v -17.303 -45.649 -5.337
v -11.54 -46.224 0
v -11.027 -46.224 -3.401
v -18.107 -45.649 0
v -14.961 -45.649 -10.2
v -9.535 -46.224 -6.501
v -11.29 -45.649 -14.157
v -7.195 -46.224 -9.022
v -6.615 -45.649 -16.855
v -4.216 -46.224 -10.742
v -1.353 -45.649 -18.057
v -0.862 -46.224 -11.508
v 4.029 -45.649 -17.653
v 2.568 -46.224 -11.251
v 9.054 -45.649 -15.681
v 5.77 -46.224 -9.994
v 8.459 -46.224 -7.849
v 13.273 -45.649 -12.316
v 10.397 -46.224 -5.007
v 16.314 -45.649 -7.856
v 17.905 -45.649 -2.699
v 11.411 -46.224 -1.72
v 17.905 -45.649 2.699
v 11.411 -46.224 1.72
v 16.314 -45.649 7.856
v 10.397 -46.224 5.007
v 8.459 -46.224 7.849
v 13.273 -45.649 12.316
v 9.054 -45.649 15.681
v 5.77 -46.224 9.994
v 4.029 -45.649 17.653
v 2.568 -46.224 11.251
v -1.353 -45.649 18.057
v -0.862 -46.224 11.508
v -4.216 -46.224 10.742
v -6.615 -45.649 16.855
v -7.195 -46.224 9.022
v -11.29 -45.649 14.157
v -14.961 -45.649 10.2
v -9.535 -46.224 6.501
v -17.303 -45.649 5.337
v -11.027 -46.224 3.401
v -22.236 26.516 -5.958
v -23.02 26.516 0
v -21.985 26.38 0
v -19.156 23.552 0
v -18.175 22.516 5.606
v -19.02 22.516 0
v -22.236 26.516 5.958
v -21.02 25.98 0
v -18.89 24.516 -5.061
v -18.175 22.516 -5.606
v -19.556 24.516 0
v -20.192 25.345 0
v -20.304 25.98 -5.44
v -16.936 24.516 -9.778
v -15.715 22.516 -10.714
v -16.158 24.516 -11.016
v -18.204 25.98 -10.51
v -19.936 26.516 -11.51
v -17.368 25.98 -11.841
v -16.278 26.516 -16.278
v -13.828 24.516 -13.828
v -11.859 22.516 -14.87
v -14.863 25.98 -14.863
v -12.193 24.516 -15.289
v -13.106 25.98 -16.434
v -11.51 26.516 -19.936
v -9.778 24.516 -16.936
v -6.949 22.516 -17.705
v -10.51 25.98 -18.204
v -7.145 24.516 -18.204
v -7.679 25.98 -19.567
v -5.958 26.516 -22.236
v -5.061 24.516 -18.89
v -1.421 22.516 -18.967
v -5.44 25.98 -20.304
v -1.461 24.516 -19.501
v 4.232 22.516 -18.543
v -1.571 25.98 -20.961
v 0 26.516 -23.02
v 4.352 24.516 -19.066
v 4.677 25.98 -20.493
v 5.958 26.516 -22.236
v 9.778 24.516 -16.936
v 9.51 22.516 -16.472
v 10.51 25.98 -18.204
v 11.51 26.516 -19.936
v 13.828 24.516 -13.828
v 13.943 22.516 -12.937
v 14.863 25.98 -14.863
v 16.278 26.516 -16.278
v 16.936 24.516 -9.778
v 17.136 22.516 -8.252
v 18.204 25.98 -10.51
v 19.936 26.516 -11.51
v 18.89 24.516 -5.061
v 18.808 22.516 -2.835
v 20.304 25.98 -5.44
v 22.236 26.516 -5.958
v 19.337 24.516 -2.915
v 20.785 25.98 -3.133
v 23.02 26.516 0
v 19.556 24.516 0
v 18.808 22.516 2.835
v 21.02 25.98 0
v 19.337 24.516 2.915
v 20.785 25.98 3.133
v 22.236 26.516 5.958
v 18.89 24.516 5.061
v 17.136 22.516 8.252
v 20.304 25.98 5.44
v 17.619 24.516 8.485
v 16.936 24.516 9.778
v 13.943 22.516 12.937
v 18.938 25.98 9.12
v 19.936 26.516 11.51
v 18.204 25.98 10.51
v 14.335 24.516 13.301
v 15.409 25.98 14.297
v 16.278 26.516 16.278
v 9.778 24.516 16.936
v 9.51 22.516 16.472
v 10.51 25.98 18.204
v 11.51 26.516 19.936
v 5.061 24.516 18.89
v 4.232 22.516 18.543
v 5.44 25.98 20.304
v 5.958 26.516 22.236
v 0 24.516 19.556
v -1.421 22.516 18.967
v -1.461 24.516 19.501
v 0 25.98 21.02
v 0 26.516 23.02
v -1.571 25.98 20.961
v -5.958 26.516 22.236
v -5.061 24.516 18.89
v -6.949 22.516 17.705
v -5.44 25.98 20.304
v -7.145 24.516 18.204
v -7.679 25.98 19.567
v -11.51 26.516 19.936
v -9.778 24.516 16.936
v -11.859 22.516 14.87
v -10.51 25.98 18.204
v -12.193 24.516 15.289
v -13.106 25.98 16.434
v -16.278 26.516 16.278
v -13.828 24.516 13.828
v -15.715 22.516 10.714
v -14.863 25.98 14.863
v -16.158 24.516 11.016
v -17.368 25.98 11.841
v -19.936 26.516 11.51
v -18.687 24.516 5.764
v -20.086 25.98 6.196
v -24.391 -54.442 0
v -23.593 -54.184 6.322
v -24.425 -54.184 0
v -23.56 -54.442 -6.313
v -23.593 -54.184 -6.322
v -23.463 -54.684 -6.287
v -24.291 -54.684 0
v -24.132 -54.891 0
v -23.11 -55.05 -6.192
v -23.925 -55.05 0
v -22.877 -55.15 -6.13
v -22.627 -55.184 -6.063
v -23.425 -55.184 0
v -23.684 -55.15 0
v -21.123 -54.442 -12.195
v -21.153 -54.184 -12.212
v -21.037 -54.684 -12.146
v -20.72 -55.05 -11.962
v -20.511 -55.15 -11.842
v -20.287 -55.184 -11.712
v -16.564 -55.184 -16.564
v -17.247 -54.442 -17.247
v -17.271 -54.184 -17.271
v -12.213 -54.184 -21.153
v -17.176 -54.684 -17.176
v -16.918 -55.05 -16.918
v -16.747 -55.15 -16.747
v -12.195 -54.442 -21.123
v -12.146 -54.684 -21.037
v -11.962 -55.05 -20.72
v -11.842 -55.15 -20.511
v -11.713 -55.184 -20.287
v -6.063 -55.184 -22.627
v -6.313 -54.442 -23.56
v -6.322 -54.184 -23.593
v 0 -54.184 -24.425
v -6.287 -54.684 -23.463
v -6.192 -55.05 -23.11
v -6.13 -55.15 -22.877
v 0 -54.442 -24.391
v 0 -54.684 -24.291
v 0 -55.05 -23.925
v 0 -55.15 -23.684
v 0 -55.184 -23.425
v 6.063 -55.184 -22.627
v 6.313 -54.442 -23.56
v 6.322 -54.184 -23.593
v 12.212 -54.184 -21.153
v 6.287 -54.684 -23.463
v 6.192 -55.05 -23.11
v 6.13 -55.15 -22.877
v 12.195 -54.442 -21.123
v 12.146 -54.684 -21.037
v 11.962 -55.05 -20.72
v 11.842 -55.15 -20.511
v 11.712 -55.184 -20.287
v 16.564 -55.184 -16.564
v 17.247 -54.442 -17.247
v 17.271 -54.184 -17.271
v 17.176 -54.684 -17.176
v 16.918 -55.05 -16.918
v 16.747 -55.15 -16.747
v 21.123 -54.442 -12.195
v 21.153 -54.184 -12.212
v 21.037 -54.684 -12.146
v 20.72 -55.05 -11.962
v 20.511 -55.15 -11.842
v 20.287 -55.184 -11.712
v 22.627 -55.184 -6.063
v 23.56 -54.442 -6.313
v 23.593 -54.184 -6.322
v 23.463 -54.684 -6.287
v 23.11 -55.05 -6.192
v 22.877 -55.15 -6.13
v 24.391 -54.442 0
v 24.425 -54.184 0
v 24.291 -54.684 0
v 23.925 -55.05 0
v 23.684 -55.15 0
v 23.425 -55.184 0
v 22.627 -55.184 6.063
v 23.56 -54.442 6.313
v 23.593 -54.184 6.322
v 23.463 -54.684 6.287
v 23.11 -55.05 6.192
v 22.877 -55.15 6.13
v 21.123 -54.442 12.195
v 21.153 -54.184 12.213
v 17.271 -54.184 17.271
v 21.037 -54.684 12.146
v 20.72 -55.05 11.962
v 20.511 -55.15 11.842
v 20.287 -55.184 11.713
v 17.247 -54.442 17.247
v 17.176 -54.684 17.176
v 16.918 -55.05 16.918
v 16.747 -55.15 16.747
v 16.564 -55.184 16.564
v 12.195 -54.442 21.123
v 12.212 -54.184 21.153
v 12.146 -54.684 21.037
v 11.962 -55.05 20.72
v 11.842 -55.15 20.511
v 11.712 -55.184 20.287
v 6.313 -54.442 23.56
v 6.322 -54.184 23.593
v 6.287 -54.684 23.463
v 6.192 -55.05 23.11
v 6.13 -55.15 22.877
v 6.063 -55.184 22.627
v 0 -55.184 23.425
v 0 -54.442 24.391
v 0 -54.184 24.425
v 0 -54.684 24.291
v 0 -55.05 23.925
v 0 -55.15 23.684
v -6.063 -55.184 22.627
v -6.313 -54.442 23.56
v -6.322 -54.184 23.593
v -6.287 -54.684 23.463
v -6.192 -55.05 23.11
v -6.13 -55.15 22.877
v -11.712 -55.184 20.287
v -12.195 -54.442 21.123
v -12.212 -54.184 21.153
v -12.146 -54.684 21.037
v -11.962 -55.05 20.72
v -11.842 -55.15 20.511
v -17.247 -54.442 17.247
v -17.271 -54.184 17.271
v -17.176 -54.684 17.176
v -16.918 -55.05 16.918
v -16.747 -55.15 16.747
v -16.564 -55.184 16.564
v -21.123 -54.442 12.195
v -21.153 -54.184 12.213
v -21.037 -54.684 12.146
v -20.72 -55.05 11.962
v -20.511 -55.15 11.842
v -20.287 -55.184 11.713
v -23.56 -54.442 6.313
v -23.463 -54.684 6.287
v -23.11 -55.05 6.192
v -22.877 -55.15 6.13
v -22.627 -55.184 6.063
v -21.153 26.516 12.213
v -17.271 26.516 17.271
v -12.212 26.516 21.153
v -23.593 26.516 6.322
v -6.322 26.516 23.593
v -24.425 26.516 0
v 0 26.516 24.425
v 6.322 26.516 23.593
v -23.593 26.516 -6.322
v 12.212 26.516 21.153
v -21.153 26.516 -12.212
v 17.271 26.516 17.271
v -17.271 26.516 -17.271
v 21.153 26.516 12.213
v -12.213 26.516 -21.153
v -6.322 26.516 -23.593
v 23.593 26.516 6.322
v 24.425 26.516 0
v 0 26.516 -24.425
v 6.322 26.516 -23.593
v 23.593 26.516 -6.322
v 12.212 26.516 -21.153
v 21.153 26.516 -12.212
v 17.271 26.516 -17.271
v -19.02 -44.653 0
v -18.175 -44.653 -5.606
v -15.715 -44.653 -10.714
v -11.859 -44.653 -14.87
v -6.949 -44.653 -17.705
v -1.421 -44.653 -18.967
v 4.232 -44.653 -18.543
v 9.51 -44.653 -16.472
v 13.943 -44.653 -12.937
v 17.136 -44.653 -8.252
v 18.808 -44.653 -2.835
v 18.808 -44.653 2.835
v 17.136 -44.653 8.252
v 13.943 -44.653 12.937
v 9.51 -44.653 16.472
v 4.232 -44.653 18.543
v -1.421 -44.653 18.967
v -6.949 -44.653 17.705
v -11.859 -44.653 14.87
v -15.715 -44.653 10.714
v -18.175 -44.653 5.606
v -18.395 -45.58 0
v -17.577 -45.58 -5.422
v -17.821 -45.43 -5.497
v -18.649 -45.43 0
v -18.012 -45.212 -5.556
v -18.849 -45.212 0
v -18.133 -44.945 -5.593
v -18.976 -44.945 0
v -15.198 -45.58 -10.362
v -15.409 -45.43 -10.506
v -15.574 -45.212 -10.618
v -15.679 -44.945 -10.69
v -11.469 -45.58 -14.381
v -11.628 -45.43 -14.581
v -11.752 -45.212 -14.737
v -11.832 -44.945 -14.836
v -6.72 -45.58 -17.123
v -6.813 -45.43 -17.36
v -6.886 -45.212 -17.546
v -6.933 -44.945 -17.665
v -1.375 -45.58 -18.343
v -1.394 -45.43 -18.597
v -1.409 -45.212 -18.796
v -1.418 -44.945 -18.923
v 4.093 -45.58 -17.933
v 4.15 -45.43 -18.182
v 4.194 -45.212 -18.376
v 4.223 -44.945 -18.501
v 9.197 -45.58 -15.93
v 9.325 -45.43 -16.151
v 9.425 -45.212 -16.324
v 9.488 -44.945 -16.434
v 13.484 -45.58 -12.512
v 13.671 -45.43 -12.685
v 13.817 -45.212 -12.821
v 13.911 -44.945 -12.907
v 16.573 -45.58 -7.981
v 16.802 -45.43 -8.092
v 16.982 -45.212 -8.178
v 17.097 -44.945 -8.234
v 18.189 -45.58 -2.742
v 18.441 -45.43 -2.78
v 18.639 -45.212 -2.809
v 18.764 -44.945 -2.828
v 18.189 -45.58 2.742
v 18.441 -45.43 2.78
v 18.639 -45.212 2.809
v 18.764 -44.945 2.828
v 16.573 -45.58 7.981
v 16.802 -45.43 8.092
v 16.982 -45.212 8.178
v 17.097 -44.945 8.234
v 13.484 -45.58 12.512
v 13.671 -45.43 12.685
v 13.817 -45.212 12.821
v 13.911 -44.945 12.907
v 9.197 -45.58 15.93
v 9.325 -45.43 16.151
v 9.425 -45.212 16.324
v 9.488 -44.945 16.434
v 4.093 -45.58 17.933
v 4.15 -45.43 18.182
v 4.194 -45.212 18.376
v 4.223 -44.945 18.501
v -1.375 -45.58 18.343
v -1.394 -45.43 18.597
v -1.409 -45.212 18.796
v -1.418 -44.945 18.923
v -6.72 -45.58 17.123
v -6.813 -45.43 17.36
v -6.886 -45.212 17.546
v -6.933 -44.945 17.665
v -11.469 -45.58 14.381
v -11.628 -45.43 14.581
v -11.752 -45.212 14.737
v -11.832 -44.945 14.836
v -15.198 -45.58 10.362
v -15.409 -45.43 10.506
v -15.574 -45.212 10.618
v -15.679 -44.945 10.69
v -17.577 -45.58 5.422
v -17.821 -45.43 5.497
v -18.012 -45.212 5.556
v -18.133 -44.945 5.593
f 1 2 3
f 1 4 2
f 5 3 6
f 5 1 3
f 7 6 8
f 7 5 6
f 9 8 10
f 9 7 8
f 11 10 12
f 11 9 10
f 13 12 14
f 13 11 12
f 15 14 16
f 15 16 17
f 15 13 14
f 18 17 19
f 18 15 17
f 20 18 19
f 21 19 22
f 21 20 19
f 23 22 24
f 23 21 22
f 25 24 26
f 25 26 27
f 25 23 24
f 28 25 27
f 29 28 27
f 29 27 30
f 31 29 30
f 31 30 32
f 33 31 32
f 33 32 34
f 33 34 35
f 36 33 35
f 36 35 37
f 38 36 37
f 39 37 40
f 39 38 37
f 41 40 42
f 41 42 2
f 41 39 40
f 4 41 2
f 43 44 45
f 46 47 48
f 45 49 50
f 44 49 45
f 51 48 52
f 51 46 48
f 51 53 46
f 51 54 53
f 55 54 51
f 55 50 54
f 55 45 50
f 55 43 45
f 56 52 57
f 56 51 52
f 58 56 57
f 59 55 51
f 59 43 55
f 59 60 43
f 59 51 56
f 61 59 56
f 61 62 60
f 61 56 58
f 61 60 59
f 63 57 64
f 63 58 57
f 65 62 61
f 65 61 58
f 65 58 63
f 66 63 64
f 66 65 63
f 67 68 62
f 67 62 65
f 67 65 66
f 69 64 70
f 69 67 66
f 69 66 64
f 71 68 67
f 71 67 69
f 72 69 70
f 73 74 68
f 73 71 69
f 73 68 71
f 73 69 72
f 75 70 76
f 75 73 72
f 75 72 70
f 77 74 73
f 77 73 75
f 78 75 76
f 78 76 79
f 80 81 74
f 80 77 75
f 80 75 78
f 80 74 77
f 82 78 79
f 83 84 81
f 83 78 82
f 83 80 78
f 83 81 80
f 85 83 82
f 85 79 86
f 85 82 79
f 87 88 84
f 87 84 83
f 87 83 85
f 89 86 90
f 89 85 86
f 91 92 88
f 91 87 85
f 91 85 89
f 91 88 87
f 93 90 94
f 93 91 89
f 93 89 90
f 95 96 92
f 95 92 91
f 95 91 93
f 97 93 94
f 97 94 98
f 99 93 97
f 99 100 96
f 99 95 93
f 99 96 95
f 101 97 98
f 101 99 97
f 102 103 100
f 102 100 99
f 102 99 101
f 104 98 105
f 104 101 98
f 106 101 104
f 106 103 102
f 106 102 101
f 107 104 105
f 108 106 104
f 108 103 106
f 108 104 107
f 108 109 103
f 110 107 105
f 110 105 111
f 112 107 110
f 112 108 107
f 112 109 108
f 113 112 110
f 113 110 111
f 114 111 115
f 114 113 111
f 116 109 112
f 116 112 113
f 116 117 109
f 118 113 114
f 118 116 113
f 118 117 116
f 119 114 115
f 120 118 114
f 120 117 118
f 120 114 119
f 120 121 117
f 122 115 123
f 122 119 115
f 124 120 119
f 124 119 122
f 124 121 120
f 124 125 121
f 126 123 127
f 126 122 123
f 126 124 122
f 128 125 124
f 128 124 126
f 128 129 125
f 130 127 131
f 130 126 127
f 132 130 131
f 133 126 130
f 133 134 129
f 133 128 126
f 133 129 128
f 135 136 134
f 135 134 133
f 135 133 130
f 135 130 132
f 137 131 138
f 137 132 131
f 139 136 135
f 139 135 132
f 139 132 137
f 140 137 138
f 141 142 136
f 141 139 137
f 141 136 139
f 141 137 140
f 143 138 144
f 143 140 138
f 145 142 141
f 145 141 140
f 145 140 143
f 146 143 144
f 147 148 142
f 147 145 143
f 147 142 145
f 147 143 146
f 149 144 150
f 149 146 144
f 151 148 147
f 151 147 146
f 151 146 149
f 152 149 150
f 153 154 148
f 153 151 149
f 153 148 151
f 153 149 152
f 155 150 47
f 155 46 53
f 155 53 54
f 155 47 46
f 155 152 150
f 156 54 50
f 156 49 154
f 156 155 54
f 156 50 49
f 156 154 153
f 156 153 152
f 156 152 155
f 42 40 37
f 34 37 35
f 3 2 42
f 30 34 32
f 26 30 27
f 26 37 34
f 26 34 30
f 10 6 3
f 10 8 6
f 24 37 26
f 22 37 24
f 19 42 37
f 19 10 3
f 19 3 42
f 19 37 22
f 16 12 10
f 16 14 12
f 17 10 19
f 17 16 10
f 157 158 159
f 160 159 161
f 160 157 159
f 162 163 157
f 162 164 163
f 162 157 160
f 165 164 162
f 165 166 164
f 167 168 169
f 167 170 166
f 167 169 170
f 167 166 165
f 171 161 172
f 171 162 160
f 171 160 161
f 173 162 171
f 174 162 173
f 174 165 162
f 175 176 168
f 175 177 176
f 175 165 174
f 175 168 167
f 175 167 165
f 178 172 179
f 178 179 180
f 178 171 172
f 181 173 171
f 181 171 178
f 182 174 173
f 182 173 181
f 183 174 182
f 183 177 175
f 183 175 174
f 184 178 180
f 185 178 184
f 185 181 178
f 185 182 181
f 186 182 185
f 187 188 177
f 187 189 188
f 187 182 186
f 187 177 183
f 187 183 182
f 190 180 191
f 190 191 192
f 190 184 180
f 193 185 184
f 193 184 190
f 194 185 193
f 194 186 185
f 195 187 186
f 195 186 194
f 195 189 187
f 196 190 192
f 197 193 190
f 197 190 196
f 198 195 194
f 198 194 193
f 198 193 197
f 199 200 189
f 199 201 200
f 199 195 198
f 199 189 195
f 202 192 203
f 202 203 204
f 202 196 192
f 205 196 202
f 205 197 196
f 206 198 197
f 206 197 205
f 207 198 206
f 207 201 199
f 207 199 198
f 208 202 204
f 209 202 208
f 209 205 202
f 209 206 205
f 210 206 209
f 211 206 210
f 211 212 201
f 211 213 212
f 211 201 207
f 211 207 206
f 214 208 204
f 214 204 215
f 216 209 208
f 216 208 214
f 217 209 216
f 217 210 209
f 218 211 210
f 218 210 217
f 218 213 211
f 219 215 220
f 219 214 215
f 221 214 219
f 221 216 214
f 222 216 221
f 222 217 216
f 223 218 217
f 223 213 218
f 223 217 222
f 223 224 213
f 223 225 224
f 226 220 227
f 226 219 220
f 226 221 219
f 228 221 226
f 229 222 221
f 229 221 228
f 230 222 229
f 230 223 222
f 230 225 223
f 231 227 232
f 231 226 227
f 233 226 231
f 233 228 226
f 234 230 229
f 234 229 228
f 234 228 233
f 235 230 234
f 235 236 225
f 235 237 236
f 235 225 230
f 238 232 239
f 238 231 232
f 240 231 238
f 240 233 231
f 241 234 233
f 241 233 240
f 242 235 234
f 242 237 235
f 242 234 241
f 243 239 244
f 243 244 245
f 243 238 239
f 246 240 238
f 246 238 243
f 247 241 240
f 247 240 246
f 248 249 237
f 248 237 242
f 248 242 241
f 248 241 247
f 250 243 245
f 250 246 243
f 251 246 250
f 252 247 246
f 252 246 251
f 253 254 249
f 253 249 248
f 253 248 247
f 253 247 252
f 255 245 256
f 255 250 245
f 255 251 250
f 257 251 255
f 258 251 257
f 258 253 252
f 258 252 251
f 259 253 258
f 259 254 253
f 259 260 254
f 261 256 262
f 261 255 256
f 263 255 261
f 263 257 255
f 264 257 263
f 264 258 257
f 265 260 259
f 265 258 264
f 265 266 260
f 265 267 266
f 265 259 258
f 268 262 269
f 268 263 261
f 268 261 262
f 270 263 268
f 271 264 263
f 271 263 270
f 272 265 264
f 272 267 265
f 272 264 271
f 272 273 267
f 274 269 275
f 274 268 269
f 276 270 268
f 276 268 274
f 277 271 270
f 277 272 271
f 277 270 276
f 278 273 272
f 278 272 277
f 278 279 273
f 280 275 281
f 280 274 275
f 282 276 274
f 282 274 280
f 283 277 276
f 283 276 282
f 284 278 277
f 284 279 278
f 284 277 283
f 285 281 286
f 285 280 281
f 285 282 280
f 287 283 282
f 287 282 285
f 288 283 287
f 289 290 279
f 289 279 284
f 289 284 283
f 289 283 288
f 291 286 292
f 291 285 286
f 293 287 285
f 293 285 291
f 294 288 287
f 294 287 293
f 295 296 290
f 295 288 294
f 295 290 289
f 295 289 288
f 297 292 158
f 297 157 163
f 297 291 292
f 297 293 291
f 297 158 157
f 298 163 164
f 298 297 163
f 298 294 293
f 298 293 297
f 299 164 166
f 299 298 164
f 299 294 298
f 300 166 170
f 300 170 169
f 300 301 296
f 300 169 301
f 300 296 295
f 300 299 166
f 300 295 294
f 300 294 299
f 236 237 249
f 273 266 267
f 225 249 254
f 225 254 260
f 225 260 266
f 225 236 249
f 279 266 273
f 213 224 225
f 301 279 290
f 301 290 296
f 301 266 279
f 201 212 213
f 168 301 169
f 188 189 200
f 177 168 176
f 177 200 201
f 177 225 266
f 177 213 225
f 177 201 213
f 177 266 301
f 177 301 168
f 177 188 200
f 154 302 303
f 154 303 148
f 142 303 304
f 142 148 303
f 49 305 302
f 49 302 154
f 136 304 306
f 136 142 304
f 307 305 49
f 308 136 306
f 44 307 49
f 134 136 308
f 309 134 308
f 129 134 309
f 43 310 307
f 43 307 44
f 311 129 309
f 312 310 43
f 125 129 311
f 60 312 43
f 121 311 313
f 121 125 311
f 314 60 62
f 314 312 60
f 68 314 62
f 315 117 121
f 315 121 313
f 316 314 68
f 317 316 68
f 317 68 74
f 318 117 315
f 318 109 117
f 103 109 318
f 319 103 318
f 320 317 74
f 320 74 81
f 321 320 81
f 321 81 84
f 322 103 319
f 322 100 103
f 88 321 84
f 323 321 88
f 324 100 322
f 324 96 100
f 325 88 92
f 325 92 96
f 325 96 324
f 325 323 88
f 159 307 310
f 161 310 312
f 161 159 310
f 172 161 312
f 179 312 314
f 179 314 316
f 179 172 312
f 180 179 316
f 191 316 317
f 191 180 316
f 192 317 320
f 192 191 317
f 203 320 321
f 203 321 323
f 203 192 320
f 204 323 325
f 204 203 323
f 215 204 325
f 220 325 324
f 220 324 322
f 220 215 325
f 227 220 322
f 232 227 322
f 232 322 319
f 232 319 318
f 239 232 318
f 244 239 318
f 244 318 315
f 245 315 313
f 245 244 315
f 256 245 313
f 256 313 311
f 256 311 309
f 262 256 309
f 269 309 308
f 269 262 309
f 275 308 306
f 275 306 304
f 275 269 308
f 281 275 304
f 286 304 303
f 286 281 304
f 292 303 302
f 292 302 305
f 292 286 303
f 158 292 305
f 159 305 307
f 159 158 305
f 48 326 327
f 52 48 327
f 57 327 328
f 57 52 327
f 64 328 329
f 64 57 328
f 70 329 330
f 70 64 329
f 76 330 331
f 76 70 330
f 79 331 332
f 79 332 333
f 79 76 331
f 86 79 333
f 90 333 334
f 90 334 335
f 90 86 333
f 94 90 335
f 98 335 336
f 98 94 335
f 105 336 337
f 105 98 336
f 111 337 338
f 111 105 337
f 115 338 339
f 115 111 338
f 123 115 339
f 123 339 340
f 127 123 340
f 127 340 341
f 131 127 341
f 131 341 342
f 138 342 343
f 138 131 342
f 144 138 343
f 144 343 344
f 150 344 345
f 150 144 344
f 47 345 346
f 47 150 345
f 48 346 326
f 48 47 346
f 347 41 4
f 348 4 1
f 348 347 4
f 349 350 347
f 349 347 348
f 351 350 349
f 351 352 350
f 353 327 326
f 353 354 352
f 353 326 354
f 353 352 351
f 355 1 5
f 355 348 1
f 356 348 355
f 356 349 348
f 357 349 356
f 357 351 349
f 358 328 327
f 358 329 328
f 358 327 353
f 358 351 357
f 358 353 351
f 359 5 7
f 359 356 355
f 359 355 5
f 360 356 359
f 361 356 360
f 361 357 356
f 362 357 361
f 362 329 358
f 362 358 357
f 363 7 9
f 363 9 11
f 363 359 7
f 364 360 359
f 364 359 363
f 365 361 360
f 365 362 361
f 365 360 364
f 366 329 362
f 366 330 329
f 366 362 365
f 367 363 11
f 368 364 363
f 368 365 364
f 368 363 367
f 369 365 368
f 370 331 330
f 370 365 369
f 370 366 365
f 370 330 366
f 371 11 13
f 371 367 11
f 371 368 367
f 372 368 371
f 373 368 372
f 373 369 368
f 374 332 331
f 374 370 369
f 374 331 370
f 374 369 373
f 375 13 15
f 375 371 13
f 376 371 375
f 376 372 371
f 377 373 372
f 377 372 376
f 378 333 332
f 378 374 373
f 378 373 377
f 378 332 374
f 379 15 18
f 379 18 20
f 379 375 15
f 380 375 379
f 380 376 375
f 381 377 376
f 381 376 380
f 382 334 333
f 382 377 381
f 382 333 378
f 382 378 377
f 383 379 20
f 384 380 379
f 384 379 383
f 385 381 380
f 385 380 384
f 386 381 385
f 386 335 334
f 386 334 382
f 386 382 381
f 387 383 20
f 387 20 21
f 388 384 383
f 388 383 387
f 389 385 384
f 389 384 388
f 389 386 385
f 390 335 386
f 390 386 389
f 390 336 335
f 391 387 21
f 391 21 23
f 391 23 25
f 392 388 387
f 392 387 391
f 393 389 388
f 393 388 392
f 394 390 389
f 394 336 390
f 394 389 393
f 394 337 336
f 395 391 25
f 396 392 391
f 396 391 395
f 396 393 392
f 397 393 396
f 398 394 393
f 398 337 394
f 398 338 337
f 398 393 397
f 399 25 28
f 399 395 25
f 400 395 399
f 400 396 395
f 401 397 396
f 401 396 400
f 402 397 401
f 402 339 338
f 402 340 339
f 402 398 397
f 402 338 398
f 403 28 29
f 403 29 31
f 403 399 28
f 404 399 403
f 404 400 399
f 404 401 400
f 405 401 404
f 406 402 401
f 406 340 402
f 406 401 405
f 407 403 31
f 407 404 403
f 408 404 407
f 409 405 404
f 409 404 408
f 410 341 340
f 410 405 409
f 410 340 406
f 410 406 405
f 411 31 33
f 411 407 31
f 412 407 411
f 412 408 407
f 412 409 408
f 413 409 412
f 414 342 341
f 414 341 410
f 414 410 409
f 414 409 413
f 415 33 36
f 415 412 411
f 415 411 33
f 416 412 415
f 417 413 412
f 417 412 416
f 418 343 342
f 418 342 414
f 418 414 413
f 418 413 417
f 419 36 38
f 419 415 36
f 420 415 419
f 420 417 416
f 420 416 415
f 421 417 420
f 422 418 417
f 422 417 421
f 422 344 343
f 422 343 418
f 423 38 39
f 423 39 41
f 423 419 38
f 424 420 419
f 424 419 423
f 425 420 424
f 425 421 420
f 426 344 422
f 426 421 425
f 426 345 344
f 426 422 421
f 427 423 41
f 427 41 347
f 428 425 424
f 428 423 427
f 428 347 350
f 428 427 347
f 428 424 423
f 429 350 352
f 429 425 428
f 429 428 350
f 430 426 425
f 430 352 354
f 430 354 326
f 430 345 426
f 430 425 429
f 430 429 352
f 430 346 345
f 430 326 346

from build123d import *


with BuildPart() as part:
    # Szkic1 → Obrót1 (revolve)
    with BuildSketch(Plane.XY):
        with BuildLine():
            Line((0, -46.223602563), (-11.54, -46.223602563))
            Line((-11.54, -46.223602563), (-18.107155743, -45.649050884))
            ThreePointArc((-18.107155743, -45.649050884), (-18.757277337, -45.328446393), (-19.02, -44.652856186))
            Line((-19.02, -44.652856186), (-19.02, 22.516397437))
            ThreePointArc((-19.02, 22.516397437), (-20.191572875, 25.344824562), (-23.02, 26.516397437))
            Line((-23.02, 26.516397437), (-24.42, 26.516397437))
            Line((-24.42, 26.516397437), (-24.425, 26.516397437))
            Line((-24.425, 26.516397437), (-24.425, -54.183602563))
            ThreePointArc((-24.425, -54.183602563), (-24.132106781, -54.890709344), (-23.425, -55.183602563))
            Line((-23.425, -55.183602563), (0, -55.183602563))
            Line((0, -55.183602563), (0, -46.223602563))
        make_face()
    revolve(axis=Axis((0, 49.541128149, 0), (0, -1, 0)))


solid = part.part
